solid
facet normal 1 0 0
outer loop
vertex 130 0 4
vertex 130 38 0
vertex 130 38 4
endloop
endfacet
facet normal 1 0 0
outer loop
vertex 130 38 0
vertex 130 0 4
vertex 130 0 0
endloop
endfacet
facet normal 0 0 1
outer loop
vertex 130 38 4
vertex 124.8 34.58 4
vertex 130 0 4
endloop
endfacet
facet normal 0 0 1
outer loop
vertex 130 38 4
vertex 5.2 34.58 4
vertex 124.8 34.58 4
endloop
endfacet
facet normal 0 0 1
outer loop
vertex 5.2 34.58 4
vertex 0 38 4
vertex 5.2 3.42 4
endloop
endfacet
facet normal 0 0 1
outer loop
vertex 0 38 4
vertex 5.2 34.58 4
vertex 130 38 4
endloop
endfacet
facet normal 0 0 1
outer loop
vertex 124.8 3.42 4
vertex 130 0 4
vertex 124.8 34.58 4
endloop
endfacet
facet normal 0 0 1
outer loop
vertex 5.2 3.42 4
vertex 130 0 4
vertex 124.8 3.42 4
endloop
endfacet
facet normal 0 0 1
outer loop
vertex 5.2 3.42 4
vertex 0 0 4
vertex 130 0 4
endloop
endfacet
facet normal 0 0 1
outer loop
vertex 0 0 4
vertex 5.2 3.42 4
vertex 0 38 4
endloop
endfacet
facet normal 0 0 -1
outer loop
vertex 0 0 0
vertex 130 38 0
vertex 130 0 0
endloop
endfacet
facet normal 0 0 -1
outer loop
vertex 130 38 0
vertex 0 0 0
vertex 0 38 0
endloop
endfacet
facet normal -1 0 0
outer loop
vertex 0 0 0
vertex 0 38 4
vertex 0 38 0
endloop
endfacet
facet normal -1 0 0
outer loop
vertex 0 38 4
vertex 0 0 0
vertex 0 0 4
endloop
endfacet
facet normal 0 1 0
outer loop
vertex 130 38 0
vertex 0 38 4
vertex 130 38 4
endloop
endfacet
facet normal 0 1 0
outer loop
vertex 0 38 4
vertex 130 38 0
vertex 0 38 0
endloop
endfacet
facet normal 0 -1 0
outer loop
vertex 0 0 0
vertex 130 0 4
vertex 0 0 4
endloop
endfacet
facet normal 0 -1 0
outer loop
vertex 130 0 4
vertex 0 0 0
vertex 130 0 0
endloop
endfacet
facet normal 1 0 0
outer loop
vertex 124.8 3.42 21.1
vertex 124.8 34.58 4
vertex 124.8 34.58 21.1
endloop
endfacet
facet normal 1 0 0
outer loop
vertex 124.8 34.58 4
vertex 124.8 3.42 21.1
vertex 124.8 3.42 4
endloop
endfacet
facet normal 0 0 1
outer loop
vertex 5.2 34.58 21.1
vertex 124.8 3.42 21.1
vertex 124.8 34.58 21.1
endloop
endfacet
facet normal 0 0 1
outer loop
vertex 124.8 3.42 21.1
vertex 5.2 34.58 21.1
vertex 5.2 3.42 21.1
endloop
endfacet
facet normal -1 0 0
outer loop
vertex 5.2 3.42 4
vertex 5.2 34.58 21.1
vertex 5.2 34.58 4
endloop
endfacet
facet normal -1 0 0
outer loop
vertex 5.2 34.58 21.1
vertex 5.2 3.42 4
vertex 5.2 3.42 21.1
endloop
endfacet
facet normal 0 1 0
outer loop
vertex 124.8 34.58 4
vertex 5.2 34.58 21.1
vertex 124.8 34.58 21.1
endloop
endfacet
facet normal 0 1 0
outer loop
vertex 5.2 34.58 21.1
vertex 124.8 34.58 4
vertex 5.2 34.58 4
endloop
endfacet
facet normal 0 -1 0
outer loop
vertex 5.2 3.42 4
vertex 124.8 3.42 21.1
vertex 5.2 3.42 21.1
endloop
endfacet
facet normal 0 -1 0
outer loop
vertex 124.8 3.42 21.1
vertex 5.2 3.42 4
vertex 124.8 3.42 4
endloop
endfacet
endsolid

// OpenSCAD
union() {
	translate(v = [65.0, 19.0, 2.0]) {
		cube(center = true, size = [130.0, 38.0, 4.0]);
	}
	translate(v = [65.0, 19.0, 12.55]) {
		cube(center = true, size = [119.6, 31.16, 17.1]);
	}
}
